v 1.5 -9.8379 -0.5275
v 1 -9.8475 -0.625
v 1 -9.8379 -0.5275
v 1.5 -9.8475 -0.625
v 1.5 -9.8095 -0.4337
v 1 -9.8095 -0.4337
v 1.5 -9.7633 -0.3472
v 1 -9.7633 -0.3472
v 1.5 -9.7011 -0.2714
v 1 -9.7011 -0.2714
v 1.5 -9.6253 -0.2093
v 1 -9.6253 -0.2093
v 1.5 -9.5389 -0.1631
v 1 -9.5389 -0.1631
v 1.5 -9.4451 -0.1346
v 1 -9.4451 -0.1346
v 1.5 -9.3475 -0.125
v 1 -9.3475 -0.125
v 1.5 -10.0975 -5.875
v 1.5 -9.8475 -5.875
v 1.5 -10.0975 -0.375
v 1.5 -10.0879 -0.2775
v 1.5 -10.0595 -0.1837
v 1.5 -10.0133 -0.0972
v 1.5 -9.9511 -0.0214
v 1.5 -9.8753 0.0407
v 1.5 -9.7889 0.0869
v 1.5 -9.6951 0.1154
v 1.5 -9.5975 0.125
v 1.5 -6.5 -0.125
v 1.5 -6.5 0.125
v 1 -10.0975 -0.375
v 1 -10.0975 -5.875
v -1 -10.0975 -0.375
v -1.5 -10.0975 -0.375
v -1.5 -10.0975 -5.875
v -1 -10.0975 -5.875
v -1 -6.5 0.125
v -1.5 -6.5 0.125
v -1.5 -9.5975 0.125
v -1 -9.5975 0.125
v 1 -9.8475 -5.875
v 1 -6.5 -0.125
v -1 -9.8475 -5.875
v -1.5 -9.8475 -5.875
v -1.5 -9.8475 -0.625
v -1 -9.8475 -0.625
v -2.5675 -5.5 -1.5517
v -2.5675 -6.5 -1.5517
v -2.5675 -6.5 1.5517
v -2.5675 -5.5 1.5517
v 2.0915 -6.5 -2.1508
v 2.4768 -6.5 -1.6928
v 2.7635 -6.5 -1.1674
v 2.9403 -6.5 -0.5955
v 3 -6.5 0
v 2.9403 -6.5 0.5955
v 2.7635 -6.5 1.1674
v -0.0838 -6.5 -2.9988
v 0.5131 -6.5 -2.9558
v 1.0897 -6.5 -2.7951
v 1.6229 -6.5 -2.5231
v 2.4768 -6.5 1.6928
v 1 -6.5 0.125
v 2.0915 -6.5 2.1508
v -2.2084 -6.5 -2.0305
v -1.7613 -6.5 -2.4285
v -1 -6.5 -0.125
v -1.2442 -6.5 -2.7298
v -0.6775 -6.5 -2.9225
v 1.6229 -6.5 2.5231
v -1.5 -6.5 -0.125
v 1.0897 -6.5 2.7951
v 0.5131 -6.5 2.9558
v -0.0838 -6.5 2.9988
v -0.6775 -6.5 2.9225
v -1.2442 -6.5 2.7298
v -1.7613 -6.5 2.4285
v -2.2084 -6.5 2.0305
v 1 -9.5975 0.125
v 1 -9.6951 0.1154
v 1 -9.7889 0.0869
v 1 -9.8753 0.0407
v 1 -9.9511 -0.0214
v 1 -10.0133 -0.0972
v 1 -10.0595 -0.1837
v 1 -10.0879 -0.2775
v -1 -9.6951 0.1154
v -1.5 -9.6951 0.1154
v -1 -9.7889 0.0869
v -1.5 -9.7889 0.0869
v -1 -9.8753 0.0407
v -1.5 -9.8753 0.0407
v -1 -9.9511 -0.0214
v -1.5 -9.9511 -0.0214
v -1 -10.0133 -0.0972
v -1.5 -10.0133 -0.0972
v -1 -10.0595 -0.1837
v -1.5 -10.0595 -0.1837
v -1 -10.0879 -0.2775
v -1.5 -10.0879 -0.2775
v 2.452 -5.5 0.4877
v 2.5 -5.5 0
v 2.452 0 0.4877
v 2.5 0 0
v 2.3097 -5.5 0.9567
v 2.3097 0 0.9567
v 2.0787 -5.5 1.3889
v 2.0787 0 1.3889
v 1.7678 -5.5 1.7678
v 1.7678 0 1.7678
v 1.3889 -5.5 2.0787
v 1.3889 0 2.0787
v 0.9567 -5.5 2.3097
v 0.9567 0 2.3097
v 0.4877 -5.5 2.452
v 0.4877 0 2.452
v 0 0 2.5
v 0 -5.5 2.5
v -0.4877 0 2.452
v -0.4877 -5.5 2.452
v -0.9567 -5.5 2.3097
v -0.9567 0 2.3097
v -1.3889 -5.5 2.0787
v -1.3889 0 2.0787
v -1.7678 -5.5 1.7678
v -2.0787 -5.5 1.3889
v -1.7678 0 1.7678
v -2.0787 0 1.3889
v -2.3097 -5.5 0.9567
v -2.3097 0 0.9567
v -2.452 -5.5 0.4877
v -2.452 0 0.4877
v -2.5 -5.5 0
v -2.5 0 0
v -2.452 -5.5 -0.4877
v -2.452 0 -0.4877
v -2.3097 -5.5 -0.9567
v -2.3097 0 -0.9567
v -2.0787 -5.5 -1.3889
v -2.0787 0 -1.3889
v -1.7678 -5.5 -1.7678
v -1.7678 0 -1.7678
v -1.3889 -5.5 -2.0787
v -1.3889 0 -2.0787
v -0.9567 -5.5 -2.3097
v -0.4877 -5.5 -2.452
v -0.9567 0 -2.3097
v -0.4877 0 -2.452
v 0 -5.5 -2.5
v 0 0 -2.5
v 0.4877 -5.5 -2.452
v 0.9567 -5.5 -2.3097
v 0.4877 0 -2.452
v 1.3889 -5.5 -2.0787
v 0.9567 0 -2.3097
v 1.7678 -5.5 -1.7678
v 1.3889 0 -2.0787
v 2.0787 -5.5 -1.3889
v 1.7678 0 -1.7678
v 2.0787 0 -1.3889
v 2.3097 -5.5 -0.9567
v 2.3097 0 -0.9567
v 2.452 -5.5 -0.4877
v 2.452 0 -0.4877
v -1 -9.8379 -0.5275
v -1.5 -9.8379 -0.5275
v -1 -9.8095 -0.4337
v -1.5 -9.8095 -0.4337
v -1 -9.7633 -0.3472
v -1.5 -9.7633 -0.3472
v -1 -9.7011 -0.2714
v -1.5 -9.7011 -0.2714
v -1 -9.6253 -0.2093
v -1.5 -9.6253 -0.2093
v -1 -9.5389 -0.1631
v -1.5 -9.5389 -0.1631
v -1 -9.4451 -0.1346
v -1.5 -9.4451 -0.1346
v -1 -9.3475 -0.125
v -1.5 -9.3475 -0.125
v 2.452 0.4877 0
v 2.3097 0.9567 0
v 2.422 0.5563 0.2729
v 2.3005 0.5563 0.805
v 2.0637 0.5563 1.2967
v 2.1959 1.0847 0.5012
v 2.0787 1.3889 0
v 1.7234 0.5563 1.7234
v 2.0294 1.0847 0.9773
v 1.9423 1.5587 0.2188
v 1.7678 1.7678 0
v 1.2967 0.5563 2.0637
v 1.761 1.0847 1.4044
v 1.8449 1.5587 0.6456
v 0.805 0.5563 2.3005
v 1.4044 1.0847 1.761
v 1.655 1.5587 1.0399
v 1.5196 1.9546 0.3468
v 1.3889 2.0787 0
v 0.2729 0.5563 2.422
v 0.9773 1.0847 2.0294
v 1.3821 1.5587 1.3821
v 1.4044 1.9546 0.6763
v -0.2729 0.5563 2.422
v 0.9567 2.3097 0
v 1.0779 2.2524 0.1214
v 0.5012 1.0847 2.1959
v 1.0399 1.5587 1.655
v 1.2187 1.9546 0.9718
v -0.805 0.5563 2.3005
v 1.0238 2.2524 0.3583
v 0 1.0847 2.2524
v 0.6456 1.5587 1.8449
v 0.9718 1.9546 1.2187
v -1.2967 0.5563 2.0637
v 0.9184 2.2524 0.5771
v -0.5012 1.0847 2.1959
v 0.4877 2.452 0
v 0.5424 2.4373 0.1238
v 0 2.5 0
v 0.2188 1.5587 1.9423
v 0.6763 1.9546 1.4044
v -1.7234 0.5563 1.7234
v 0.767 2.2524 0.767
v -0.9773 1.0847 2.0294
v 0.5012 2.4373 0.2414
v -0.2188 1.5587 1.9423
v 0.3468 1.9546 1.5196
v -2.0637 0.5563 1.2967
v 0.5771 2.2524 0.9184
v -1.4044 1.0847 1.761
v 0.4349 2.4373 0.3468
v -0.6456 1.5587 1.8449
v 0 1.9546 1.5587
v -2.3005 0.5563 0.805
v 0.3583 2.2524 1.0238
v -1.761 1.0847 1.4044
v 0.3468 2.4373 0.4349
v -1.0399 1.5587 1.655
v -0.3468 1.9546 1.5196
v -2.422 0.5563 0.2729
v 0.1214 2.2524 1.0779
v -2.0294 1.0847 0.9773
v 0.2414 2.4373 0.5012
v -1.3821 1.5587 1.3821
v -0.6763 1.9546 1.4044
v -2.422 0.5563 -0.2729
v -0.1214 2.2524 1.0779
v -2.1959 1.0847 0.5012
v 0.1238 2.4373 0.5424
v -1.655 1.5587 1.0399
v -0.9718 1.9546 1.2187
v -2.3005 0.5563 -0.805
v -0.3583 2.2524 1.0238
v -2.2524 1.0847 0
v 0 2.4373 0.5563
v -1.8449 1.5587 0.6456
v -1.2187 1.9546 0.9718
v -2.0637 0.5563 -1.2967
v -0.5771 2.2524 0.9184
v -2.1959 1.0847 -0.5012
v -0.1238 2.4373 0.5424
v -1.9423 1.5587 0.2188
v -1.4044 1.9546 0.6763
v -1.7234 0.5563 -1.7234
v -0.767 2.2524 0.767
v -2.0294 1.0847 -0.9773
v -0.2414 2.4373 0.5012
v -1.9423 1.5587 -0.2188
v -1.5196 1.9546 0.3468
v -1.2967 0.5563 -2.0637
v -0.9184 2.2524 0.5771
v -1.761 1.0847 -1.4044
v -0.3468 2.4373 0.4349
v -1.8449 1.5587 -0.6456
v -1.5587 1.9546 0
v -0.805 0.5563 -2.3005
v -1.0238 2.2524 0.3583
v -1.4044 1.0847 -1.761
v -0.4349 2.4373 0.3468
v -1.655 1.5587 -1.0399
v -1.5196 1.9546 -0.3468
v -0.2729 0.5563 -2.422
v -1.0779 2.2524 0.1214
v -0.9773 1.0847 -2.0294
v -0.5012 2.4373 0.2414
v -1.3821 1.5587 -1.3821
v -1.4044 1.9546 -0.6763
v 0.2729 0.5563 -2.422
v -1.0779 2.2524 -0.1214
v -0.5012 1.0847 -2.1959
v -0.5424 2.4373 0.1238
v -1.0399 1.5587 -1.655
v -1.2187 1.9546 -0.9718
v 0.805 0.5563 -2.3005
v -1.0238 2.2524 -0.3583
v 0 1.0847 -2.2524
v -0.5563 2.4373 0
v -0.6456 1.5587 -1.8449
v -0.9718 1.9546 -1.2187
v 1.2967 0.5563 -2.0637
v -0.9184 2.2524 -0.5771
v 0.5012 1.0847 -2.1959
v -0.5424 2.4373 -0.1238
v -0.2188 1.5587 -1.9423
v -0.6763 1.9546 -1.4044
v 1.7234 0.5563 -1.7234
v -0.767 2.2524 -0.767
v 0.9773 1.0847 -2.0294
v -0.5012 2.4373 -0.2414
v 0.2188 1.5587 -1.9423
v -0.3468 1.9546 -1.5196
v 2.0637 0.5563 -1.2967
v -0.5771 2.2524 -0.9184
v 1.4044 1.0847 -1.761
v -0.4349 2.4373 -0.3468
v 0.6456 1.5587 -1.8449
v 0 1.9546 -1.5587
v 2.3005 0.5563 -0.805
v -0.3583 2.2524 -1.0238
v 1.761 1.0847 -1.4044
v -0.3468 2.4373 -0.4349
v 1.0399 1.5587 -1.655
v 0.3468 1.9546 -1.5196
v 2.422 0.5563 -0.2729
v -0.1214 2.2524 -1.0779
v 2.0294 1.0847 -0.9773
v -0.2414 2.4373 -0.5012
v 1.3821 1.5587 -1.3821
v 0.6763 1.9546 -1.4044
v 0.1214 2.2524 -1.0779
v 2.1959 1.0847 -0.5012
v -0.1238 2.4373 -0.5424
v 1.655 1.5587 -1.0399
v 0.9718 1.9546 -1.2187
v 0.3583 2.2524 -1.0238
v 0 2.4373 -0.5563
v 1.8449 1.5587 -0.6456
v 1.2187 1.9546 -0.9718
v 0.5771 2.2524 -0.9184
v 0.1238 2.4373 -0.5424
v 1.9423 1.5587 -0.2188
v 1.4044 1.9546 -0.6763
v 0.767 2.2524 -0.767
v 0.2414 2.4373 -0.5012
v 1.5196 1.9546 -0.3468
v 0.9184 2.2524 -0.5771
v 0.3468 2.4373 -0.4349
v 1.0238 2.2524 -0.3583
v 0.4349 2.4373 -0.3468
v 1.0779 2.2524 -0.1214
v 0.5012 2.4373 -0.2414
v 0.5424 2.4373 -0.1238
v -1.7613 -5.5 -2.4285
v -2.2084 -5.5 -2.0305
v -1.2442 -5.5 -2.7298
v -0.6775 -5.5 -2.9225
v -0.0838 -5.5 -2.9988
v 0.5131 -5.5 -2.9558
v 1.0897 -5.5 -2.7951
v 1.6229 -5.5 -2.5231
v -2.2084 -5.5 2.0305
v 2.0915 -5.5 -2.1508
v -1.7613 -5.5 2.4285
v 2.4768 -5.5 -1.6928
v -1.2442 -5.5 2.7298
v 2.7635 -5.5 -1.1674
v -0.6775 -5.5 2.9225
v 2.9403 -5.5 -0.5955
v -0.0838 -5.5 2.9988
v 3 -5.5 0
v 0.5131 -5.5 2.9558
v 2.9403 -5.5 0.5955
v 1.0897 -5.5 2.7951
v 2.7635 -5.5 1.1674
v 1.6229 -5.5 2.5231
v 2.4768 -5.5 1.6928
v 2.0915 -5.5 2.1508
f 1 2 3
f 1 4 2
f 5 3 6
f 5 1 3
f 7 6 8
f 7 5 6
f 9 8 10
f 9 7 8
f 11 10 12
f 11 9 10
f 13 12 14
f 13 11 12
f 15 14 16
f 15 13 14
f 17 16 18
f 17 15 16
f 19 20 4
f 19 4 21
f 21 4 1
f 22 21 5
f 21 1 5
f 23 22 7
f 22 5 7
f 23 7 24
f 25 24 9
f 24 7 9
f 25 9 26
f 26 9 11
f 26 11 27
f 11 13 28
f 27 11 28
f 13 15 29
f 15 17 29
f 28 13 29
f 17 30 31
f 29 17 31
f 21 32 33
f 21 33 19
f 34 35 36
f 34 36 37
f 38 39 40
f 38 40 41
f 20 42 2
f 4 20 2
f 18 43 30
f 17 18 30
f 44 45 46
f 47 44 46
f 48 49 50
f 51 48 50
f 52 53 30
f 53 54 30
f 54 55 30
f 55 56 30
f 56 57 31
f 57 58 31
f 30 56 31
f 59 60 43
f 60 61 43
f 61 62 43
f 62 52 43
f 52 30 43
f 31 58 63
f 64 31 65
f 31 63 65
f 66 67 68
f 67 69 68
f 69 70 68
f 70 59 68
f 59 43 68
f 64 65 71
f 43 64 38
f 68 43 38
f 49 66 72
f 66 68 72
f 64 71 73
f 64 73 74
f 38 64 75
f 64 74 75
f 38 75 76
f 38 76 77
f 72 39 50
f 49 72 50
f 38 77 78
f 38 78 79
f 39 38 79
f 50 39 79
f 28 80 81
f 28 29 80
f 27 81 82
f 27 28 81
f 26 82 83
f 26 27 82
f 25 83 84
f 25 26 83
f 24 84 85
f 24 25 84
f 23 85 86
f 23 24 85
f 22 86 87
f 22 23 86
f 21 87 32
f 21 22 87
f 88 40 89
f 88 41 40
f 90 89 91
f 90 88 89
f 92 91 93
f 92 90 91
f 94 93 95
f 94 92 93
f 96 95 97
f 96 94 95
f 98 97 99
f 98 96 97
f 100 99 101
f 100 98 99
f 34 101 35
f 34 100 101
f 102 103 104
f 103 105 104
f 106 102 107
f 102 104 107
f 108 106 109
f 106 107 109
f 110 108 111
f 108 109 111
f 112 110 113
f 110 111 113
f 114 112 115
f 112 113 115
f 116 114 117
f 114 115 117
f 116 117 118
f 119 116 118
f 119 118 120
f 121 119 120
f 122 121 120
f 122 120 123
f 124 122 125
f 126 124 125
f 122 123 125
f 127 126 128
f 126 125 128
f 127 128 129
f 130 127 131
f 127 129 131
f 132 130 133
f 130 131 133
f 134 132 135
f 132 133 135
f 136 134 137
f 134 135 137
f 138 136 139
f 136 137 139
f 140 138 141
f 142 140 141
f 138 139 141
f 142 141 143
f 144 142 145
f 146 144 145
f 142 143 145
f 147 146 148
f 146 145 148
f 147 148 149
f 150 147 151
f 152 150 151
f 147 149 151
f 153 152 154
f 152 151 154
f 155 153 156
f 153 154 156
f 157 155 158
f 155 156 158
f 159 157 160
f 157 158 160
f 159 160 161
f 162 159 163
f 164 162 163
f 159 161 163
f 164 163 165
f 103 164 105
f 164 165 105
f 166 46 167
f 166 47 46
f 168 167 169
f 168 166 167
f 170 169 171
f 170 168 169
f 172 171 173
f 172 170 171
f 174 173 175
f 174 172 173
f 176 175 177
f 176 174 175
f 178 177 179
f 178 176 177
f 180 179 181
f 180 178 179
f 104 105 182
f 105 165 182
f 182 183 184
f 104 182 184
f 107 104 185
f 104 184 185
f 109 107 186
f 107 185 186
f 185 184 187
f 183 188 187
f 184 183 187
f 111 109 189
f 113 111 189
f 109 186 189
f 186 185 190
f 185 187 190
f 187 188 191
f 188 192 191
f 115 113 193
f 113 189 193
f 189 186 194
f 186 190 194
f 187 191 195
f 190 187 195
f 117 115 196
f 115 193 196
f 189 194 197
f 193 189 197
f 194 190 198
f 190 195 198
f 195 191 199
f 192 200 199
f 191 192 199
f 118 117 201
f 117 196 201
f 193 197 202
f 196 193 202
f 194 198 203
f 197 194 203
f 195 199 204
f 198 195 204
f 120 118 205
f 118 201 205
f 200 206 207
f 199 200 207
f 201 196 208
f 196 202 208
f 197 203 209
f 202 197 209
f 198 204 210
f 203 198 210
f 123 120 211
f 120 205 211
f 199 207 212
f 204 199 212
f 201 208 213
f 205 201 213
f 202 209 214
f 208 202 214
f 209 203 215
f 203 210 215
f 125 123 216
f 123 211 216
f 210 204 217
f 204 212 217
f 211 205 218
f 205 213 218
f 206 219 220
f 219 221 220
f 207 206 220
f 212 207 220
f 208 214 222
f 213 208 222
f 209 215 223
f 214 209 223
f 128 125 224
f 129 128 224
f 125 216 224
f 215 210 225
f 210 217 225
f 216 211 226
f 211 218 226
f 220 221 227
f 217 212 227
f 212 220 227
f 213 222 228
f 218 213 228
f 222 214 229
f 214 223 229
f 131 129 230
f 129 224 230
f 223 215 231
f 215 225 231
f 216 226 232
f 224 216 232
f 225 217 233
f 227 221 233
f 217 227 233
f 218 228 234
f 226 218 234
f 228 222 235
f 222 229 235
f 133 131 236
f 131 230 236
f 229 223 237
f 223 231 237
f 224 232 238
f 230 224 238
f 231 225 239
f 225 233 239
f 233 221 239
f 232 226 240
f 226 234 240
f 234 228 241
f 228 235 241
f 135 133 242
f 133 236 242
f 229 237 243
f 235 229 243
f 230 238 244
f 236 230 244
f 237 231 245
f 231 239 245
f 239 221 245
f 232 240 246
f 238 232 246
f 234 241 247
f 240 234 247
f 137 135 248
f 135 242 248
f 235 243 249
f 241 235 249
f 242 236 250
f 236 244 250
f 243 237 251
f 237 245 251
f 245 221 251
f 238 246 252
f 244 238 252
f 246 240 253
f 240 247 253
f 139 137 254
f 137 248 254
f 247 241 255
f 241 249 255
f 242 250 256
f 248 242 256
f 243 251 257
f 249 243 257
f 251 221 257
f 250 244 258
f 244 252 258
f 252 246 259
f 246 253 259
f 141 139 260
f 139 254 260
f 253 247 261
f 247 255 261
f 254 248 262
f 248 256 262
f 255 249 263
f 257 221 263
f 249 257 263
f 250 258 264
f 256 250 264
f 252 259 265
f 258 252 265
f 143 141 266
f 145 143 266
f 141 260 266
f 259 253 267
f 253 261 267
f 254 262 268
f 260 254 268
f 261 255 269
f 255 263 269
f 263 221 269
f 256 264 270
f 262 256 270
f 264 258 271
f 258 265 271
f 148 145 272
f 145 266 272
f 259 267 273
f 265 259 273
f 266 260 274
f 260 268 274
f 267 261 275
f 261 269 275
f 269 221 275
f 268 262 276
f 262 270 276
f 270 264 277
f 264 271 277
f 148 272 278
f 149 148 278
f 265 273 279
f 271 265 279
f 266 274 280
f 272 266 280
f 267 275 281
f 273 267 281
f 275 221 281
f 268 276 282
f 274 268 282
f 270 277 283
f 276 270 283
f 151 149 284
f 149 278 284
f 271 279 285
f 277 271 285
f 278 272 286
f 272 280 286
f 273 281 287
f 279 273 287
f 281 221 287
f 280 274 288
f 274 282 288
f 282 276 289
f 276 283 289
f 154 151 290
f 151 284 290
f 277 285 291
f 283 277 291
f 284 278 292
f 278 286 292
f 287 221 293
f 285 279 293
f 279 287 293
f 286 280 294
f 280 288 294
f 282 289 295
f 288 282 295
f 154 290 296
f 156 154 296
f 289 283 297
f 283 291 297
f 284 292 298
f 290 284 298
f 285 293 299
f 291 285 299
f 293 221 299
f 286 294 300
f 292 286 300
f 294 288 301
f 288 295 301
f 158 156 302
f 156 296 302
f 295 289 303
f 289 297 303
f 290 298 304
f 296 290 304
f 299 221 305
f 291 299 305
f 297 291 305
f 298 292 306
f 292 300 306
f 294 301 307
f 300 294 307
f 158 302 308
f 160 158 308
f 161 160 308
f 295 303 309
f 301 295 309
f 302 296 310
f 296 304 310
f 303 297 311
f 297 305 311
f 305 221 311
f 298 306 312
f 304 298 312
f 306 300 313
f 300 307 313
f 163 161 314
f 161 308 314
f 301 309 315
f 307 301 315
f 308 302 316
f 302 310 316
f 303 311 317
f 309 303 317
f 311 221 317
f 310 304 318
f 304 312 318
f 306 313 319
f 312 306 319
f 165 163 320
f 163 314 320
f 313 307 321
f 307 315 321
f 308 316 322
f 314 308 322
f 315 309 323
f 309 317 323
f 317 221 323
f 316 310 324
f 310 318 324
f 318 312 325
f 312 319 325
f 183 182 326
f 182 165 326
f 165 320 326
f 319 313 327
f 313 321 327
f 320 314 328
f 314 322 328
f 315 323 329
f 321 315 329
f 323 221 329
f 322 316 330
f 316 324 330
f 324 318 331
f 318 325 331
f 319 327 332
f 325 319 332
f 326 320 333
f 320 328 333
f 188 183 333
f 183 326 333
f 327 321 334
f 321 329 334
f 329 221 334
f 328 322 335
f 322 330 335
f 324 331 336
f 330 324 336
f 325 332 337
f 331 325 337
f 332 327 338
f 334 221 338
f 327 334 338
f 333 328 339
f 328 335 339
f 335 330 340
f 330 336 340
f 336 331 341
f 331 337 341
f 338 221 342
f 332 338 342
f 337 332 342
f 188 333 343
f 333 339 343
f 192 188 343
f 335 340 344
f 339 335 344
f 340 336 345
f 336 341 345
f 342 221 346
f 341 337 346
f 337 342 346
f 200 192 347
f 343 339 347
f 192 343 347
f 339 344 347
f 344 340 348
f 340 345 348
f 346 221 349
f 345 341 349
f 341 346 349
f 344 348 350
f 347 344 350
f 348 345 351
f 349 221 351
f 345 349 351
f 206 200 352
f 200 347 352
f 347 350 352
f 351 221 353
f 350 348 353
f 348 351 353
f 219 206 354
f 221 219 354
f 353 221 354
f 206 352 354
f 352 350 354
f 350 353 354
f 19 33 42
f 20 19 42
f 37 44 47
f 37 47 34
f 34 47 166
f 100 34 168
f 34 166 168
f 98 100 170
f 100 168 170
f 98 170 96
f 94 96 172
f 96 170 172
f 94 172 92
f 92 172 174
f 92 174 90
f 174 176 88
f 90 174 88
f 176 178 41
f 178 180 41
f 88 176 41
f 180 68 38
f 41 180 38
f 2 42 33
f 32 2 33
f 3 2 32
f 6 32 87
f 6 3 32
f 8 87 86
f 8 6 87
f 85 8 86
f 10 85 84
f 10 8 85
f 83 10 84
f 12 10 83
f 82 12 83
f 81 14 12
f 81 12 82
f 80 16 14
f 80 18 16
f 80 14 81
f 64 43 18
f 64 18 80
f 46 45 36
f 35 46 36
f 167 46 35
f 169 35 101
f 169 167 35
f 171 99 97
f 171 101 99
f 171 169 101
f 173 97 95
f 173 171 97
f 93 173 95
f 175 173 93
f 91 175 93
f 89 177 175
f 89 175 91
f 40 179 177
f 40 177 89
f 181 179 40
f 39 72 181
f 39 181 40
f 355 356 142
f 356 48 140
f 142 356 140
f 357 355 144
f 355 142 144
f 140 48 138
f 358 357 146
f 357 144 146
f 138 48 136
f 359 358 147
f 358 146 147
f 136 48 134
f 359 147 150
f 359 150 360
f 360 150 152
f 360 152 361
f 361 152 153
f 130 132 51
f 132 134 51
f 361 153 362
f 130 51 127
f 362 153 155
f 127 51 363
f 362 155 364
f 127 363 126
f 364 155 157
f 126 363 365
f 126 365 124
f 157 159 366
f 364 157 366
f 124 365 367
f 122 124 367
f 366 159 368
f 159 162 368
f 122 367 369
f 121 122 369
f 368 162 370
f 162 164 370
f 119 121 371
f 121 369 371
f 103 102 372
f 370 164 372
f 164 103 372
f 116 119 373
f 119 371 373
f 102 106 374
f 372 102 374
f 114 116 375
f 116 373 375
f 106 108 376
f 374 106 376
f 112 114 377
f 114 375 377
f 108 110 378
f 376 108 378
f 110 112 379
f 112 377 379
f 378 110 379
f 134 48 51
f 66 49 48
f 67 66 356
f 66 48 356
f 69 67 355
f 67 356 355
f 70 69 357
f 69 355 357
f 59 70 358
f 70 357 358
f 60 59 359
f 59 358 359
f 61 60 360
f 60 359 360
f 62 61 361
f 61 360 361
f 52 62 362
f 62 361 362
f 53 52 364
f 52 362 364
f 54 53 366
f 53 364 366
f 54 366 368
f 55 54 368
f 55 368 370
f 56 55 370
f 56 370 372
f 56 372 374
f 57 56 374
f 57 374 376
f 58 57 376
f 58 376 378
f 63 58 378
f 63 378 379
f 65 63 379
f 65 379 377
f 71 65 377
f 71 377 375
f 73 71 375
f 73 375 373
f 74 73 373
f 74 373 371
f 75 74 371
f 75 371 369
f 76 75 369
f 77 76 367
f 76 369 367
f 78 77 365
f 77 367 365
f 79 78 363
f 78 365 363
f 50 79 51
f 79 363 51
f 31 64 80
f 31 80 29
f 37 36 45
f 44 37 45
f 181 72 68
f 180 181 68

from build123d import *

# Parameters (mm, degrees)
SKETCH2_W           = 0.5
SKETCH2_H           = 0.25
EXTRUDE1_DEPTH      = 30
SKETCH3_W           = 0.5
SKETCH3_H           = 10
EXTRUDE3_DEPTH      = 2
EXTRUDE3_DEPTH_BACK = 2
SKETCH4_W           = 0.5
SKETCH4_H           = 3.5
EXTRUDE4_DEPTH      = 2
BOSS_EXTRUDE1_DEPTH = 3
CUT_EXTRUDE1_DEPTH  = 10
FILLET1_R           = 0.5


with BuildPart() as part:
    # Sketch1 → Revolve1 (revolve)
    with BuildSketch(Plane.XY):
        with BuildLine():
            Line((0, 2.5), (0, -5.5))
            Line((0, -5.5), (0, -6.5))
            Line((0, -6.5), (3, -6.5))
            Line((3, -6.5), (3, -5.5))
            Line((3, -5.5), (2.5, -5.5))
            Line((2.5, -5.5), (2.5, 0))
            ThreePointArc((2.5, 0), (1.767766953, 1.767766953), (0, 2.5))
        make_face()
    revolve(axis=Axis((0, 40.48125, 0), (0, -1, 0)))

    # Sketch2 → Extrude1 (add)
    with BuildSketch(Plane.XZ.offset(6.5)):
        with Locations((1.25, 0)):
            Rectangle(SKETCH2_W, SKETCH2_H)
        with Locations((-1.25, 0)):
            Rectangle(SKETCH2_W, SKETCH2_H)
    extrude(amount=EXTRUDE1_DEPTH)

    # Sketch3 → Extrude3 (cut, two sides)
    with BuildSketch(Plane.XY) as extrude3_sk:
        with Locations((-1.25, -31.5)):
            Rectangle(SKETCH3_W, SKETCH3_H)
    extrude(amount=EXTRUDE3_DEPTH, mode=Mode.SUBTRACT)
    extrude(extrude3_sk.sketch, amount=-EXTRUDE3_DEPTH_BACK, mode=Mode.SUBTRACT)

    # Sketch4 → Extrude4 (cut)
    with BuildSketch(Plane.XZ.offset(6.5)):
        with Locations((-2.817517664, 0)):
            Rectangle(SKETCH4_W, SKETCH4_H)
    extrude(amount=-EXTRUDE4_DEPTH, mode=Mode.SUBTRACT)

    # Sketch5 → Boss-Extrude1 (add)
    with BuildSketch(Plane.ZY.offset(1.5)):
        Polygon((0.125, -10.097548576), (-5.875, -10.097548576), (-5.875, -9.847548576), (-0.125, -9.847548576), align=None)
    extrude(amount=-BOSS_EXTRUDE1_DEPTH)

    # Sketch6 → Cut-Extrude1 (cut)
    with BuildSketch(Plane.XY.offset(0.125)):
        Polygon((-1, -8.951862253), (1, -8.951862253), (1, -10.097548576), (1.5, -10.097548576), (1.5, -37.452172459), (-1.5, -37.452172459), (-1.5, -10.097548576), (-1, -10.097548576), align=None)
    extrude(amount=-CUT_EXTRUDE1_DEPTH, mode=Mode.SUBTRACT)

    # Fillet1
    fillet1_edges = [part.edges().sort_by_distance(p)[0] for p in [
        (1.25, -10.097548576, 0.125),
        (-1.25, -10.097548576, 0.125),
        (-1.25, -9.847548576, -0.125),
        (1.25, -9.847548576, -0.125),
    ]]
    fillet(fillet1_edges, radius=FILLET1_R)


solid = part.part
